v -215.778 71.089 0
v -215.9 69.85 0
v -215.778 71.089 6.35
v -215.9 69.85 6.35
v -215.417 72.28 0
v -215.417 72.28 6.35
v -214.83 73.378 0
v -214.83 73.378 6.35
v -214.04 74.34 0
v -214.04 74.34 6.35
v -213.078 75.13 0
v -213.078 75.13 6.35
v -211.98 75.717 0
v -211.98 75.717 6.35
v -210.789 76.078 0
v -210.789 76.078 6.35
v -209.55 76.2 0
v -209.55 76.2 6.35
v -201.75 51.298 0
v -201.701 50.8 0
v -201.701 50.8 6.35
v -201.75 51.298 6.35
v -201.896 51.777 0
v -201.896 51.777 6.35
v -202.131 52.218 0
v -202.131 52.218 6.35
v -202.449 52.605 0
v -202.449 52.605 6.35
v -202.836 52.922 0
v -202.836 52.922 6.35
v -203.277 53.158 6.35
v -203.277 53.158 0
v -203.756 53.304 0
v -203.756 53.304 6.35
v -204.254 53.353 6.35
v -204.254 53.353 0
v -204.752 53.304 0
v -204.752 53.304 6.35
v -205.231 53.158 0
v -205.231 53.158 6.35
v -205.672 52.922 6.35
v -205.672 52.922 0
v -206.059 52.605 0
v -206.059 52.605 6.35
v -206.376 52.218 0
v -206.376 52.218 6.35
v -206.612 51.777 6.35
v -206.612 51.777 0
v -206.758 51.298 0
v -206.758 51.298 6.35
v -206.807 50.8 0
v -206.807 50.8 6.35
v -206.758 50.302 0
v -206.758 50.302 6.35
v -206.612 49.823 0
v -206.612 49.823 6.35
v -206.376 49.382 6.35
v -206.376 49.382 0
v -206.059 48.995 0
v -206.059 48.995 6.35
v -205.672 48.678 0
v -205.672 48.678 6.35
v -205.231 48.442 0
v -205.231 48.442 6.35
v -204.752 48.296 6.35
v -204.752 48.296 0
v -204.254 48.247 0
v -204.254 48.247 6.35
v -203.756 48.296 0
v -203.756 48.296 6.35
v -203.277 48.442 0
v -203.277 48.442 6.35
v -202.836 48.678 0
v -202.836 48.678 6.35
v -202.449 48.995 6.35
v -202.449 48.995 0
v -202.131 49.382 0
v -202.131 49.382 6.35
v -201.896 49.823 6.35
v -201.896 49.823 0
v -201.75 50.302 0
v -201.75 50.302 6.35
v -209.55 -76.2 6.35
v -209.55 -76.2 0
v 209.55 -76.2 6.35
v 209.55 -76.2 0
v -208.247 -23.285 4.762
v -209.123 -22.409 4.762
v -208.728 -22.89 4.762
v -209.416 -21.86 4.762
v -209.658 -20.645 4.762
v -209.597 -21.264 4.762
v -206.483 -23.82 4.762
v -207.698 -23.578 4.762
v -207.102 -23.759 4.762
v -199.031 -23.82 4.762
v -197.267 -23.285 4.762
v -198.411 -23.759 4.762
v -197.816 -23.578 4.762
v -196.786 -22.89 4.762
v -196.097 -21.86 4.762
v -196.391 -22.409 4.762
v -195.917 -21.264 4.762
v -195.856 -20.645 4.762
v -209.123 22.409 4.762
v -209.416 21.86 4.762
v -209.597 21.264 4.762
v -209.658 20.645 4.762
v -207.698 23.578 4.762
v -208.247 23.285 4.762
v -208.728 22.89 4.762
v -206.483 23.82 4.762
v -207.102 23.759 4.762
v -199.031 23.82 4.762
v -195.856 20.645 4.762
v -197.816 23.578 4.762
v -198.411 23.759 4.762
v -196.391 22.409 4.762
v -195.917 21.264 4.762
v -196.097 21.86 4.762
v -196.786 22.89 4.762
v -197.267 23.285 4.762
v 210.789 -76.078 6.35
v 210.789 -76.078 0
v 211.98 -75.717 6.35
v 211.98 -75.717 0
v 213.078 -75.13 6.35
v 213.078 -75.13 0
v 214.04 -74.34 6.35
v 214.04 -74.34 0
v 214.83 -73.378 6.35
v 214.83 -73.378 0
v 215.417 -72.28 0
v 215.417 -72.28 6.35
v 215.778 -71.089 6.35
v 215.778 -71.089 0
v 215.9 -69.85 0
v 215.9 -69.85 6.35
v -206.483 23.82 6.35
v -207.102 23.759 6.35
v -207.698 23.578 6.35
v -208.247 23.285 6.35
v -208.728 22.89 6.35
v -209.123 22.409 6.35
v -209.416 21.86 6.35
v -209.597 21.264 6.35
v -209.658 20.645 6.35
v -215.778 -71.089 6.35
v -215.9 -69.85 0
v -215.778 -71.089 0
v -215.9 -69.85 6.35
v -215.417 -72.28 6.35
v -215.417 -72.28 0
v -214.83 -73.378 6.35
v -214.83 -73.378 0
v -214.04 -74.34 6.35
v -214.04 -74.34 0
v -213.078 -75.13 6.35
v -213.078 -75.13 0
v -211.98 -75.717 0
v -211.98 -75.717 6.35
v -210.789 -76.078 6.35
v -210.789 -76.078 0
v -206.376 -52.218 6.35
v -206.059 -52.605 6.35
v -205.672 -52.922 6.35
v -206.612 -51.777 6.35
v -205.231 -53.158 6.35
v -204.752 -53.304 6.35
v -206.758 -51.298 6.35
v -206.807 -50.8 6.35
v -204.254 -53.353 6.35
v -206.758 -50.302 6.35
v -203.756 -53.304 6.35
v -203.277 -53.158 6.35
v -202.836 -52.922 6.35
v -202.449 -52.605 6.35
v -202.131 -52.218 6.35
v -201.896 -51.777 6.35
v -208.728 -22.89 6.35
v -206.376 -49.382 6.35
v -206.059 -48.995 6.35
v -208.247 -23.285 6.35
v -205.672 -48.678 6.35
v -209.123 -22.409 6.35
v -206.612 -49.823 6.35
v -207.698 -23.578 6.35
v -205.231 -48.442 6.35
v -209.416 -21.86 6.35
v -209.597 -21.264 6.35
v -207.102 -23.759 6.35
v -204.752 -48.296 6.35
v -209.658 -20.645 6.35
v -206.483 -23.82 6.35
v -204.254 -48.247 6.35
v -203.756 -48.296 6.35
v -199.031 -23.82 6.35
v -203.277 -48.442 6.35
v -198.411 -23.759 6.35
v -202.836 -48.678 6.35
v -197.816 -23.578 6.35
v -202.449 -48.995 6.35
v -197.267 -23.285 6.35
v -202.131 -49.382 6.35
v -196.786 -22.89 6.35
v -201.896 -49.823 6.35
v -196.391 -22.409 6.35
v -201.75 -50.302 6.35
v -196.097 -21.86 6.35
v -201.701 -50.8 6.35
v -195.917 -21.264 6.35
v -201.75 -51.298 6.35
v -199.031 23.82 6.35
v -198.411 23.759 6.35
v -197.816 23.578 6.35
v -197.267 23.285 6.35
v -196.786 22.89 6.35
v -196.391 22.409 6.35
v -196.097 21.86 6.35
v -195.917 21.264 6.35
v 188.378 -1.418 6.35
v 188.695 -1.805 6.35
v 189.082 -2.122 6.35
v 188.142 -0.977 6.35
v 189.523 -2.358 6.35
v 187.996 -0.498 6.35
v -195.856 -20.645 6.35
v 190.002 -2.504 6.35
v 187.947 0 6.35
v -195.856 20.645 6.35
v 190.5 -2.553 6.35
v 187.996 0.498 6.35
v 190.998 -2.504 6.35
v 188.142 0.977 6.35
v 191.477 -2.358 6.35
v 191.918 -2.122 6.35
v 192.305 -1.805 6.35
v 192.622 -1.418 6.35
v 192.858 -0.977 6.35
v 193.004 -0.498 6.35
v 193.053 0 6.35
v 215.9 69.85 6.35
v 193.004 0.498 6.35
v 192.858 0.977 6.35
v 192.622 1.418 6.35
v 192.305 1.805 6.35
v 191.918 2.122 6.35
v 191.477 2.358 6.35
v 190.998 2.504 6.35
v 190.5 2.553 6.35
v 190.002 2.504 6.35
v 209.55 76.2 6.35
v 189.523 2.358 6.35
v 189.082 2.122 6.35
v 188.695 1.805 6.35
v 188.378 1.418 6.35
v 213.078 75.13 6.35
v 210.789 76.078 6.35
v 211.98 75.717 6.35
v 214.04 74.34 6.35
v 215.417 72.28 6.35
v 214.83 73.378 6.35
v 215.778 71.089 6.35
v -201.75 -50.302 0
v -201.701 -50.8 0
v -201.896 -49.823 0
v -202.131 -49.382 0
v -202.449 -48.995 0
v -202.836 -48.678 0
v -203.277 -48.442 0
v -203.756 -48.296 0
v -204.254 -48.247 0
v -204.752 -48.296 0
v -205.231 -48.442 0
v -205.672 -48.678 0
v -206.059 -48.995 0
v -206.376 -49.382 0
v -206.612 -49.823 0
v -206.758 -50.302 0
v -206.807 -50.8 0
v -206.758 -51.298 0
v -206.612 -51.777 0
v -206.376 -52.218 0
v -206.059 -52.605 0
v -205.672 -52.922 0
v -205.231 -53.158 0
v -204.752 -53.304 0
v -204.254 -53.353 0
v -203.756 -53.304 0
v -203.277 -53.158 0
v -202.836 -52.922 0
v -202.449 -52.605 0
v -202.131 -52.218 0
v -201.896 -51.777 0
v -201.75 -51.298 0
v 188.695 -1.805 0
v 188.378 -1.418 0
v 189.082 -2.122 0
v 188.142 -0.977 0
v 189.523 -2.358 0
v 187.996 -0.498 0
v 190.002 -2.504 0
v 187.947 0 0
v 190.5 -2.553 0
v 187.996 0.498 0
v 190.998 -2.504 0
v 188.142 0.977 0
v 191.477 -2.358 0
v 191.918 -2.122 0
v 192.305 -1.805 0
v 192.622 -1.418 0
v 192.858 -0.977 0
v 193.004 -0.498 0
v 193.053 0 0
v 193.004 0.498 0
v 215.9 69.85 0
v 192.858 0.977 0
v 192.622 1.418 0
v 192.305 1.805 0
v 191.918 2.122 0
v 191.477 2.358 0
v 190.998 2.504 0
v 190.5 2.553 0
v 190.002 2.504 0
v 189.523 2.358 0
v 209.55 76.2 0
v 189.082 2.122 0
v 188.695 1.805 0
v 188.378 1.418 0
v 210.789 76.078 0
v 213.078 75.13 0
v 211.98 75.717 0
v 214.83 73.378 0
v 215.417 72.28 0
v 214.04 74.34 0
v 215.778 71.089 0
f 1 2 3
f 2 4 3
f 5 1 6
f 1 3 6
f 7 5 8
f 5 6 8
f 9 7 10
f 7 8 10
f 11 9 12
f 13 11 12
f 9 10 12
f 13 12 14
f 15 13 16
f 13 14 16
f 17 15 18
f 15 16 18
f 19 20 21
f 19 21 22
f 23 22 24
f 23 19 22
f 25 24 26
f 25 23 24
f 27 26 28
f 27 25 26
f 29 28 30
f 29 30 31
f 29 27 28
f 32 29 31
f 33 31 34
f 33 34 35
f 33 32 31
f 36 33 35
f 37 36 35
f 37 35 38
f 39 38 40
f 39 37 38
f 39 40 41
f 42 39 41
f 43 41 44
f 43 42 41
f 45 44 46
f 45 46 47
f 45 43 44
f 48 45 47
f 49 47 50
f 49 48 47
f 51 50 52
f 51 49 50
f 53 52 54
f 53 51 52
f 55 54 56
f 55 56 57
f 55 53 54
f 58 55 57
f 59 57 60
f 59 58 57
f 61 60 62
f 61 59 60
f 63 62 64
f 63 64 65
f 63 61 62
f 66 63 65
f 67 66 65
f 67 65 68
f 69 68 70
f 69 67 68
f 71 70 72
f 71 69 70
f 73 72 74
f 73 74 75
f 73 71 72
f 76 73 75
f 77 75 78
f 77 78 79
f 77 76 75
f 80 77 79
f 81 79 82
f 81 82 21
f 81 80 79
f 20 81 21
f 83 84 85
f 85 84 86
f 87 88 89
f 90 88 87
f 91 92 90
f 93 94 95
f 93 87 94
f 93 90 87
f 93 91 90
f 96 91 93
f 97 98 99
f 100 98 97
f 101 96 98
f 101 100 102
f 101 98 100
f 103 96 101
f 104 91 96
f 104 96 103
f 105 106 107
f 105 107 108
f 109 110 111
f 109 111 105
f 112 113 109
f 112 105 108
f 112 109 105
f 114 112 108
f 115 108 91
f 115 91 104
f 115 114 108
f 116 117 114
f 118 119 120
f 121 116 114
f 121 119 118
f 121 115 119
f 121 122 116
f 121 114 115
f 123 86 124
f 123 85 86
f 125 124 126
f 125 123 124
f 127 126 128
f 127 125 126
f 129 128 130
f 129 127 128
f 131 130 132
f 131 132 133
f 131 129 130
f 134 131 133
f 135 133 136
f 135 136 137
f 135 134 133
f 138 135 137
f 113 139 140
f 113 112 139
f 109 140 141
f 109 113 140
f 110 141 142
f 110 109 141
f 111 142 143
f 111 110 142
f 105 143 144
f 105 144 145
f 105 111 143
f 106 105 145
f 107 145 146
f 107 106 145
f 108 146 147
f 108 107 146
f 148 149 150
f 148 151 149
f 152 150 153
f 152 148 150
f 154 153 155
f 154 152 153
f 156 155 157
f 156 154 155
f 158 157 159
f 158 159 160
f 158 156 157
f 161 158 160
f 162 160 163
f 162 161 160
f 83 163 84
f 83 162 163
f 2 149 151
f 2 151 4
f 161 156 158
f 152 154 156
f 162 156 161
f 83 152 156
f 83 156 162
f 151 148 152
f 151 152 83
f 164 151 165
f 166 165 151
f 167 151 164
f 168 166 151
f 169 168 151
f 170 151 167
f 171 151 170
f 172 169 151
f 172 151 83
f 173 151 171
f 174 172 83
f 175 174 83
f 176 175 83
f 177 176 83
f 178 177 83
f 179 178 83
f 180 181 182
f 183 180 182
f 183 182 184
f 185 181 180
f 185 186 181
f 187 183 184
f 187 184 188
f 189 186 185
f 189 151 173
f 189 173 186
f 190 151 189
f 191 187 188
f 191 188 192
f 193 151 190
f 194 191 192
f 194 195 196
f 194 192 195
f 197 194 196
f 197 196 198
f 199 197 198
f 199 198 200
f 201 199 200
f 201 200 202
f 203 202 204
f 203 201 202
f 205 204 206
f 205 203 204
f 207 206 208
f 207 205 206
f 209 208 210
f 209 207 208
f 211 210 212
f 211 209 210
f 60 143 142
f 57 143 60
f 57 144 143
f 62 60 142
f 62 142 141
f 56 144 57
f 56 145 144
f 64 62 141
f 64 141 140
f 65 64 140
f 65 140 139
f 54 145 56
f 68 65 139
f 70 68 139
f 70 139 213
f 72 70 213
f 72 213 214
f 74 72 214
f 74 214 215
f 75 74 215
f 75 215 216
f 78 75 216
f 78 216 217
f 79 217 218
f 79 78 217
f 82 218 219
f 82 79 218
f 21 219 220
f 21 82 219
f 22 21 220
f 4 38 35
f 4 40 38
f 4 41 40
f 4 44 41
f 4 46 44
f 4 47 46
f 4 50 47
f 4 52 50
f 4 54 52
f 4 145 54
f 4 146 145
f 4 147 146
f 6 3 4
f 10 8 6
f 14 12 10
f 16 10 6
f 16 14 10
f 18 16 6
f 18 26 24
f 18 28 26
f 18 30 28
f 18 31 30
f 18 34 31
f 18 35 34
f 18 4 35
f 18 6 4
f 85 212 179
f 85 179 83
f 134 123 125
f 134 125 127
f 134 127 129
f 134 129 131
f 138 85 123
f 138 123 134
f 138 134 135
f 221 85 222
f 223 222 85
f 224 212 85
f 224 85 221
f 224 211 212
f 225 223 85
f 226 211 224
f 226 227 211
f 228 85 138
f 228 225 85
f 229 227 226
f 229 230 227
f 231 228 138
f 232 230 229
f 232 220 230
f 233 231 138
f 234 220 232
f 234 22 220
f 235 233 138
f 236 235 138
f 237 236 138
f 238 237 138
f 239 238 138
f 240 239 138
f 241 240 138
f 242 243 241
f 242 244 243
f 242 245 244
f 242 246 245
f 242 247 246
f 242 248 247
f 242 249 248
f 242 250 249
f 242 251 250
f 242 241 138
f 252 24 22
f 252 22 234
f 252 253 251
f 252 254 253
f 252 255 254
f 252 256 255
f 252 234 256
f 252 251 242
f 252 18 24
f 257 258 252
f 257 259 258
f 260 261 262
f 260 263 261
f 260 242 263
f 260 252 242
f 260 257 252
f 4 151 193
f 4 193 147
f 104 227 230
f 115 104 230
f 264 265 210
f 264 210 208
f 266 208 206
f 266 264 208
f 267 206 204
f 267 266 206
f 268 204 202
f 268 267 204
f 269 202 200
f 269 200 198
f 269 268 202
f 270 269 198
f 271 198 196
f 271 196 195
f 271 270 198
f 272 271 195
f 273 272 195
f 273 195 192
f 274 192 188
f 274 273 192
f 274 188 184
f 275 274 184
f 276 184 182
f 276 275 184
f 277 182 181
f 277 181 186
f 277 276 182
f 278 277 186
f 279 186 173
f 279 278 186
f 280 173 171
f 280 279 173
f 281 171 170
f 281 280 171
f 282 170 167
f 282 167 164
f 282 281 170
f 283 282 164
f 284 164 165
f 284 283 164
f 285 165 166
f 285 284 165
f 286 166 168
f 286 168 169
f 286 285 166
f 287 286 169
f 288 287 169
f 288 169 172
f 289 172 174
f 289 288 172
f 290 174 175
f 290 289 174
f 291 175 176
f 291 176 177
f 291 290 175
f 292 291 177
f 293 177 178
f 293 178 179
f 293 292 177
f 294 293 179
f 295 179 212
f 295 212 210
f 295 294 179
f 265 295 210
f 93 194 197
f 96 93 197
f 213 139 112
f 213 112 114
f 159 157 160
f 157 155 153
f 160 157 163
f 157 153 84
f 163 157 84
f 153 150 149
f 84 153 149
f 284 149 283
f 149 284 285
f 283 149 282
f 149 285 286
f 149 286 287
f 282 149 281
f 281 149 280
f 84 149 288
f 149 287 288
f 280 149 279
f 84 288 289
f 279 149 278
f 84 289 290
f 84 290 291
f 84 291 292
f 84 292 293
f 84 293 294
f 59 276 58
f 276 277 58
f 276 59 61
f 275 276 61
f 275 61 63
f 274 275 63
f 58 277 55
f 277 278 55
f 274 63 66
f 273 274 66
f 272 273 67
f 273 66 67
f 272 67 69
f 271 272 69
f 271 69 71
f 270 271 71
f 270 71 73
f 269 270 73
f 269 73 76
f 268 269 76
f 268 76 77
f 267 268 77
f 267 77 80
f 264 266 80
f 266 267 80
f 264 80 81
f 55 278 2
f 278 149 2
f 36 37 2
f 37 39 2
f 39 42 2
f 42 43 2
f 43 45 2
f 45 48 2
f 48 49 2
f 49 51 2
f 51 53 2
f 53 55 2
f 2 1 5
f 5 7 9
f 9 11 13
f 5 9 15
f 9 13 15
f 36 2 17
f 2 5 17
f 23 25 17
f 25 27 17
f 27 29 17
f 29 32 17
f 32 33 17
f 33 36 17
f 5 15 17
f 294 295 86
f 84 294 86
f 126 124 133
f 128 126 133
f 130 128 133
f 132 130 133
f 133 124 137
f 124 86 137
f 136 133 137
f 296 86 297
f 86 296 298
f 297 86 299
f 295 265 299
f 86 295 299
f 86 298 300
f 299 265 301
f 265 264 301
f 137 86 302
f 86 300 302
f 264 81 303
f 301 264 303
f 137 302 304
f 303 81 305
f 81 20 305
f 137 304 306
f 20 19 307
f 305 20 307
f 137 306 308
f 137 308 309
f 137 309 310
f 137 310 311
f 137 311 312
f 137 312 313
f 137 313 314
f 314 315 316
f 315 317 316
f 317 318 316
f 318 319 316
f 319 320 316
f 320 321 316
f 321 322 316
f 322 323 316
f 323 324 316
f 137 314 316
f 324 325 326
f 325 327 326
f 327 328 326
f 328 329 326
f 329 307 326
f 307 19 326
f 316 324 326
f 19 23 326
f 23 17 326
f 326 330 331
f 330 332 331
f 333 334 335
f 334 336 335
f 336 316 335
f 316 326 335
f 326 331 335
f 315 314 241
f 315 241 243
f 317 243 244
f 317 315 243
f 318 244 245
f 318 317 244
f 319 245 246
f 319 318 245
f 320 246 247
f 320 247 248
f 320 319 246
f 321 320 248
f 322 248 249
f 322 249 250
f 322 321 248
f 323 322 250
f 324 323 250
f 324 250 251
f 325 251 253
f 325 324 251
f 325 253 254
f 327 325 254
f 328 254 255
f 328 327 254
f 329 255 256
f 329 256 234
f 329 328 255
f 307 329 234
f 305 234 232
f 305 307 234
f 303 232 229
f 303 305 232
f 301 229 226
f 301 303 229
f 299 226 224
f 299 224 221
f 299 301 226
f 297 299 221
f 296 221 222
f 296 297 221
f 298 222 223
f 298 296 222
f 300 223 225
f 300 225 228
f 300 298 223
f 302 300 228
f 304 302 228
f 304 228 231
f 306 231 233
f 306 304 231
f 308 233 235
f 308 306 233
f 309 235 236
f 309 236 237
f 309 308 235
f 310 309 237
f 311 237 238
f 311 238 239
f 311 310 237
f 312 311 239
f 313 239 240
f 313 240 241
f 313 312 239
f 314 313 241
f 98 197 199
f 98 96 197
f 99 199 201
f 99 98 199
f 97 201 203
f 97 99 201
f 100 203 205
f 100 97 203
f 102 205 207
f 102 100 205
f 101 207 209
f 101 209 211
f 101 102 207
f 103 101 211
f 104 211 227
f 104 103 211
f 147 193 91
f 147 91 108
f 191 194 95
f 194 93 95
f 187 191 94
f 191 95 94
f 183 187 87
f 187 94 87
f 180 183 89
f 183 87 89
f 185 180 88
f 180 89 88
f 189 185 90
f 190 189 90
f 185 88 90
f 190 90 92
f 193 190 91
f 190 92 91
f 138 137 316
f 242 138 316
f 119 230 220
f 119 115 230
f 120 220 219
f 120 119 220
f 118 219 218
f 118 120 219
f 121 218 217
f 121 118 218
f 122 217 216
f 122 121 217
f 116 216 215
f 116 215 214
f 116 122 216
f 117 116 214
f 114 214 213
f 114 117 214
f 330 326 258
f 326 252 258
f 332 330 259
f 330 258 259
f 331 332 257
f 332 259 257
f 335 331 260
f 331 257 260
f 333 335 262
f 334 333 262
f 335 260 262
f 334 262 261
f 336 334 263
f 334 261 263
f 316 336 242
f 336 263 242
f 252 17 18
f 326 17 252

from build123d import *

# Parameters (mm, degrees)
F0_W     = 431.8
F0_H     = 152.4
F0_R     = 2.5527
F1_DEPTH = 6.35
F2_W     = 13.802081
F2_H     = 47.640096
F3_DEPTH = 1.5875
F4_R     = 3.175
F5_R     = 6.35


with BuildPart() as f1:
    # F0 (on Top) → F1 (new body)
    with BuildSketch(Plane.XY):
        Rectangle(F0_W, F0_H)
        with Locations((-204.253972, -50.8)):
            Circle(F0_R, mode=Mode.SUBTRACT)
        with Locations((-204.253972, 50.8)):
            Circle(F0_R, mode=Mode.SUBTRACT)
        with Locations((190.5, 0)):
            Circle(F0_R, mode=Mode.SUBTRACT)
    extrude(amount=F1_DEPTH)

    # F2 (on face) → F3 (cut)
    with BuildSketch(Plane.XY.offset(6.35)):
        with Locations((-202.756658, 0)):
            Rectangle(F2_W, F2_H)
    extrude(amount=-F3_DEPTH, mode=Mode.SUBTRACT)

    # F4
    f4_edges = [f1.edges().sort_by_distance(p)[0] for p in [
        (-209.657699, 23.820048, 5.55625),
        (-195.855618, 23.820048, 5.55625),
        (-209.657699, -23.820048, 5.55625),
        (-195.855618, -23.820048, 5.55625),
    ]]
    fillet(f4_edges, radius=F4_R)

    # F5
    f5_edges = [f1.edges().sort_by_distance(p)[0] for p in [
        (-215.9, -76.2, 3.175),
        (-215.9, 76.2, 3.175),
        (215.9, 76.2, 3.175),
        (215.9, -76.2, 3.175),
    ]]
    fillet(f5_edges, radius=F5_R)


solid = f1.part
